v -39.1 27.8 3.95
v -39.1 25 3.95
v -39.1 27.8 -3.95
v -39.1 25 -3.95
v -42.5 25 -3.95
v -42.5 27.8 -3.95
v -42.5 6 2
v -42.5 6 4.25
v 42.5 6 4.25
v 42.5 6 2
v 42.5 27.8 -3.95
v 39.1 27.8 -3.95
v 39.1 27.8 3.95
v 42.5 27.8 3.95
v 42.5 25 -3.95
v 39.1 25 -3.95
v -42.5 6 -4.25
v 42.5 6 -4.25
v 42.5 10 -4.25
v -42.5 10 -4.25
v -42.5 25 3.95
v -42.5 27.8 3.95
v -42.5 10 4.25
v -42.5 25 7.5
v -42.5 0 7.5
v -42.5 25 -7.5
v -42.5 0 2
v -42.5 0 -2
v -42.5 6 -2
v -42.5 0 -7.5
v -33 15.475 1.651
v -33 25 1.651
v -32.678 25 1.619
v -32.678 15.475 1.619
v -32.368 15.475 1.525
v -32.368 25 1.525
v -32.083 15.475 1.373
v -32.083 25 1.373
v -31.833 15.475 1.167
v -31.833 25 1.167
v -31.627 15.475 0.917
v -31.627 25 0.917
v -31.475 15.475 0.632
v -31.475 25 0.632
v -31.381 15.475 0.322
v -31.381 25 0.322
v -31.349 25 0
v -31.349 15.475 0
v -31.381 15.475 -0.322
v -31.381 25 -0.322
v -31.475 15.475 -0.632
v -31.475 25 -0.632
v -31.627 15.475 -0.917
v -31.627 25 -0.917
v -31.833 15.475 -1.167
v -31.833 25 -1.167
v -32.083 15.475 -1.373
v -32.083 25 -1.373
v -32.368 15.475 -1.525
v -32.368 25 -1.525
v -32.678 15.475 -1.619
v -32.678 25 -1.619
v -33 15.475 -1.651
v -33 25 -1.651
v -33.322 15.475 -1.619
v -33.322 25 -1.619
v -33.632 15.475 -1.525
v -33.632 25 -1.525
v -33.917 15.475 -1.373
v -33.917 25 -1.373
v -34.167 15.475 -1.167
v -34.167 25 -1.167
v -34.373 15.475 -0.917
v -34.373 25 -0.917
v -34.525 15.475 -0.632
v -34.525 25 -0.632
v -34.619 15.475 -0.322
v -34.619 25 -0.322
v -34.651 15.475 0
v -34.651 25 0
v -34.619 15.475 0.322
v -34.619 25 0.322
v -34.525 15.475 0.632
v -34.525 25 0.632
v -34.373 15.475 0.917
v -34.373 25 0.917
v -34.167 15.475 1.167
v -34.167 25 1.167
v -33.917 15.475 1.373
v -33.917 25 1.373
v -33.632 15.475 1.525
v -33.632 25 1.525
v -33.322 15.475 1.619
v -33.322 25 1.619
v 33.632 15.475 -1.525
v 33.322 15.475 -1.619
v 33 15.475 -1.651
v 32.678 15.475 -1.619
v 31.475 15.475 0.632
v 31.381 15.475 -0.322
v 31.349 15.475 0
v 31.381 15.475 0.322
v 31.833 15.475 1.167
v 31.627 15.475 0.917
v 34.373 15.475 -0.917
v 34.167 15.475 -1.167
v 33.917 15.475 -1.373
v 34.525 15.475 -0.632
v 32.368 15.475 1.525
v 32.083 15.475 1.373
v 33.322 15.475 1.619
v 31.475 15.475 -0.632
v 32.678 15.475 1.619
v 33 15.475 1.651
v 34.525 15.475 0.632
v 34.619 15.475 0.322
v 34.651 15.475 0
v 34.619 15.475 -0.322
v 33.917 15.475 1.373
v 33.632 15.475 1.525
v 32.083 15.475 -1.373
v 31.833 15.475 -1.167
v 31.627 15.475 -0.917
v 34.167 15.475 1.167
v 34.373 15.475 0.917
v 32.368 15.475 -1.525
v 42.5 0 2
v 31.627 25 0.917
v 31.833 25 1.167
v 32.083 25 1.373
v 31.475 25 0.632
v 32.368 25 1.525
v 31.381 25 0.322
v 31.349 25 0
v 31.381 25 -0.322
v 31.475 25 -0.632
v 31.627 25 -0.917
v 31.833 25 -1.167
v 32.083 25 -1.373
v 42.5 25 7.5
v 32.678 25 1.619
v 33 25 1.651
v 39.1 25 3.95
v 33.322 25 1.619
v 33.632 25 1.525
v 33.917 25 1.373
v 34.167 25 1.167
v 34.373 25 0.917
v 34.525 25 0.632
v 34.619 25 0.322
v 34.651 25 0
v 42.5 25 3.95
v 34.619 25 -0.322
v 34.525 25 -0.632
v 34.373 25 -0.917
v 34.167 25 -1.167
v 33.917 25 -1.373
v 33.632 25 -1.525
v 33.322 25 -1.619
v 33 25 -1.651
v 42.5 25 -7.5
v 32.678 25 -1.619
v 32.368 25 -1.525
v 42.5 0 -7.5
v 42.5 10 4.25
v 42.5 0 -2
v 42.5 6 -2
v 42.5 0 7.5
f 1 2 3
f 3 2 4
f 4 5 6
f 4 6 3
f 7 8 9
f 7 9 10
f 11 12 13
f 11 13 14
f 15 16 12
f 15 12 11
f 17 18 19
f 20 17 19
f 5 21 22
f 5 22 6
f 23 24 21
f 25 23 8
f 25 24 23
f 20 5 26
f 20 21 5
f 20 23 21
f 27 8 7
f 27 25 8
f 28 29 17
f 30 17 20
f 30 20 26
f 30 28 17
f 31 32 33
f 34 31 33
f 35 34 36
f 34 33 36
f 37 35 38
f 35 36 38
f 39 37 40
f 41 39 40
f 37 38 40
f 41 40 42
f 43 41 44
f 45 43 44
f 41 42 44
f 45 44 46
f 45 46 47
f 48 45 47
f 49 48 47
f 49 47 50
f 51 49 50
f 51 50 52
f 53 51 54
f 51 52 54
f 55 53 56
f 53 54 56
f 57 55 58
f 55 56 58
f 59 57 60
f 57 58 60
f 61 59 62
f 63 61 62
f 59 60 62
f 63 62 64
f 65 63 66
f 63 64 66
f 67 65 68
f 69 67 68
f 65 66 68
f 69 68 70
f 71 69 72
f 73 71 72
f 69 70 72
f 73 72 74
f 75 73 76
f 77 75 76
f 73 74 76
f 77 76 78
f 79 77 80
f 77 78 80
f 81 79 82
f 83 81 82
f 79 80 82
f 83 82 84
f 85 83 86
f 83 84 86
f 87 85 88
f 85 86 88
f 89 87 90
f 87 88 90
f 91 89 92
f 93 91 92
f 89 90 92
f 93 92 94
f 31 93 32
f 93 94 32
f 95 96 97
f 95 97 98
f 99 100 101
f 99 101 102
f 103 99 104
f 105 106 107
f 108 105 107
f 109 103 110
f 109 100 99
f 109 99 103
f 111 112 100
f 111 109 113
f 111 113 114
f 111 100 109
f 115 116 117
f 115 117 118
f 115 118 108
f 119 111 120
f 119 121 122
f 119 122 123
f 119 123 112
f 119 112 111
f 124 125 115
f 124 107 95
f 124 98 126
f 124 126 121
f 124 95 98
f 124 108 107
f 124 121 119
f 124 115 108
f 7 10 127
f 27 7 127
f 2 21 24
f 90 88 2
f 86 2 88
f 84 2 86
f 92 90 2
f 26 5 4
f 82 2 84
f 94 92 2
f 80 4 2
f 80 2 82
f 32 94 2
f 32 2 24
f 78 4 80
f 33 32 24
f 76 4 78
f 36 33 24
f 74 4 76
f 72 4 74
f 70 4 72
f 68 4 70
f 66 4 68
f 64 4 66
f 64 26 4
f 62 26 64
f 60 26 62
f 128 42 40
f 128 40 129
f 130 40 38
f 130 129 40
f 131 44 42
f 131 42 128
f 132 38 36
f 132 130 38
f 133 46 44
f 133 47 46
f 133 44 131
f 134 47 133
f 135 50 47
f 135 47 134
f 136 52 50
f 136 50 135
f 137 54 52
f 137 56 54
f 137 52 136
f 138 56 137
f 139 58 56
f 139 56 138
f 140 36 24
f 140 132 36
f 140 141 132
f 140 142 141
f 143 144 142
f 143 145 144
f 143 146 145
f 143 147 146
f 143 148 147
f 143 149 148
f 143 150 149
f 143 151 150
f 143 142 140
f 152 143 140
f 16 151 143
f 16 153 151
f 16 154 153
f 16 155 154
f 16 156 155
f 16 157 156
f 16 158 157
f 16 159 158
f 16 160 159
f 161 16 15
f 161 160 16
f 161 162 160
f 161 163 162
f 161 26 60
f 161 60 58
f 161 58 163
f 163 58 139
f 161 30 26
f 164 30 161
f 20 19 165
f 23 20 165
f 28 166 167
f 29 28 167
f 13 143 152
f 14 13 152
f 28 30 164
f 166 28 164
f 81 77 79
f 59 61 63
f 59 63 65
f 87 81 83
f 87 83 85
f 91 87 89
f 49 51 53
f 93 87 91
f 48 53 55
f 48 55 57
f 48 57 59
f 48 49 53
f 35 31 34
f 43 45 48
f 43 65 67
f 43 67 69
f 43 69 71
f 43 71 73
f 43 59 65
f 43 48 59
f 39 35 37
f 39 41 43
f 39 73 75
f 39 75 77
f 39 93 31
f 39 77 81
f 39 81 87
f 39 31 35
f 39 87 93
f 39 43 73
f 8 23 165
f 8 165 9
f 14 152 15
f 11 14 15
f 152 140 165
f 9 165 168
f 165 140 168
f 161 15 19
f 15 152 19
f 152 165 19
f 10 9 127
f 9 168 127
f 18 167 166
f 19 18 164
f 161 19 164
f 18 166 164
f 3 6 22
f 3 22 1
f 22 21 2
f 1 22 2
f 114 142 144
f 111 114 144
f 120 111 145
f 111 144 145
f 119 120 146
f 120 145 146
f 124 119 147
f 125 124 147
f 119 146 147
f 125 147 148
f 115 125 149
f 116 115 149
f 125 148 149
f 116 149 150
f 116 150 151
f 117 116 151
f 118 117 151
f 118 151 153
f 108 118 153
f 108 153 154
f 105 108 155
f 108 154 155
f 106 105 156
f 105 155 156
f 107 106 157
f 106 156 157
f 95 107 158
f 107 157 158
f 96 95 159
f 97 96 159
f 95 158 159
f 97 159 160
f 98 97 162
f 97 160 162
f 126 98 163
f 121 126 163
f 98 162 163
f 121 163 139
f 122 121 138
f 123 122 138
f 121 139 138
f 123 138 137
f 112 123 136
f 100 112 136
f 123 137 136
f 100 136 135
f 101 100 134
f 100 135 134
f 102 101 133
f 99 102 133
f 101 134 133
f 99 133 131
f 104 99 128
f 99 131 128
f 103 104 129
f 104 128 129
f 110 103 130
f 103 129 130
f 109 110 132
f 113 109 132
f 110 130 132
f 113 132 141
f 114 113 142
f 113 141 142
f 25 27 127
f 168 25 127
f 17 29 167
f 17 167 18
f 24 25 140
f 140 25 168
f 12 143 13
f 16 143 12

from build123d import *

# Parameters (mm, degrees)
SKETCH1_W               = 85
SKETCH1_H               = 15
BOSS_EXTRUDE1_DEPTH     = 25
SKETCH2_W               = 3.4
SKETCH2_H               = 7.9
BOSS_EXTRUDE2_DEPTH     = 2.8
CUT_EXTRUDE2_DEPTH      = 90.744582009
CUT_EXTRUDE2_DEPTH_BACK = 90.744582009
SKETCH5_R               = 1.651
CUT_EXTRUDE3_DEPTH      = 9.525


with BuildPart() as part:
    # Sketch1 → Boss-Extrude1 (new body)
    with BuildSketch(Plane(origin=(0, 0, 0), x_dir=(1, 0, 0), z_dir=(0, 1, 0))):
        Rectangle(SKETCH1_W, SKETCH1_H)
    extrude(amount=BOSS_EXTRUDE1_DEPTH)

    # Sketch2 → Boss-Extrude2 (add)
    with BuildSketch(Plane(origin=(0, 25, 0), x_dir=(1, 0, 0), z_dir=(0, 1, 0))):
        with Locations((-40.8, 0)):
            Rectangle(SKETCH2_W, SKETCH2_H)
        with Locations((40.8, 0)):
            Rectangle(SKETCH2_W, SKETCH2_H)
    extrude(amount=BOSS_EXTRUDE2_DEPTH)

    # Sketch3 → Cut-Extrude2 (cut, two sides: drawn at the far end of the back side and taken through both)
    with BuildSketch(Plane(origin=(42.5, 0, 0), x_dir=(0, 0, -1), z_dir=(1, 0, 0)).offset(-CUT_EXTRUDE2_DEPTH_BACK)):
        Polygon((-2, 0), (2, 0), (2, 6), (4.25, 6), (4.25, 10), (-4.25, 10), (-4.25, 6), (-2, 6), align=None)
    extrude(amount=CUT_EXTRUDE2_DEPTH + CUT_EXTRUDE2_DEPTH_BACK, mode=Mode.SUBTRACT)

    # Sketch5 → Cut-Extrude3 (cut)
    with BuildSketch(Plane(origin=(0, 25, 0), x_dir=(1, 0, 0), z_dir=(0, 1, 0))):
        with Locations(Location((33, 0, 0), (0, 0, 270))):
            Circle(SKETCH5_R)
        with Locations(Location((-33, 0, 0), (0, 0, 270))):
            Circle(SKETCH5_R)
    extrude(amount=-CUT_EXTRUDE3_DEPTH, mode=Mode.SUBTRACT)


solid = part.part
